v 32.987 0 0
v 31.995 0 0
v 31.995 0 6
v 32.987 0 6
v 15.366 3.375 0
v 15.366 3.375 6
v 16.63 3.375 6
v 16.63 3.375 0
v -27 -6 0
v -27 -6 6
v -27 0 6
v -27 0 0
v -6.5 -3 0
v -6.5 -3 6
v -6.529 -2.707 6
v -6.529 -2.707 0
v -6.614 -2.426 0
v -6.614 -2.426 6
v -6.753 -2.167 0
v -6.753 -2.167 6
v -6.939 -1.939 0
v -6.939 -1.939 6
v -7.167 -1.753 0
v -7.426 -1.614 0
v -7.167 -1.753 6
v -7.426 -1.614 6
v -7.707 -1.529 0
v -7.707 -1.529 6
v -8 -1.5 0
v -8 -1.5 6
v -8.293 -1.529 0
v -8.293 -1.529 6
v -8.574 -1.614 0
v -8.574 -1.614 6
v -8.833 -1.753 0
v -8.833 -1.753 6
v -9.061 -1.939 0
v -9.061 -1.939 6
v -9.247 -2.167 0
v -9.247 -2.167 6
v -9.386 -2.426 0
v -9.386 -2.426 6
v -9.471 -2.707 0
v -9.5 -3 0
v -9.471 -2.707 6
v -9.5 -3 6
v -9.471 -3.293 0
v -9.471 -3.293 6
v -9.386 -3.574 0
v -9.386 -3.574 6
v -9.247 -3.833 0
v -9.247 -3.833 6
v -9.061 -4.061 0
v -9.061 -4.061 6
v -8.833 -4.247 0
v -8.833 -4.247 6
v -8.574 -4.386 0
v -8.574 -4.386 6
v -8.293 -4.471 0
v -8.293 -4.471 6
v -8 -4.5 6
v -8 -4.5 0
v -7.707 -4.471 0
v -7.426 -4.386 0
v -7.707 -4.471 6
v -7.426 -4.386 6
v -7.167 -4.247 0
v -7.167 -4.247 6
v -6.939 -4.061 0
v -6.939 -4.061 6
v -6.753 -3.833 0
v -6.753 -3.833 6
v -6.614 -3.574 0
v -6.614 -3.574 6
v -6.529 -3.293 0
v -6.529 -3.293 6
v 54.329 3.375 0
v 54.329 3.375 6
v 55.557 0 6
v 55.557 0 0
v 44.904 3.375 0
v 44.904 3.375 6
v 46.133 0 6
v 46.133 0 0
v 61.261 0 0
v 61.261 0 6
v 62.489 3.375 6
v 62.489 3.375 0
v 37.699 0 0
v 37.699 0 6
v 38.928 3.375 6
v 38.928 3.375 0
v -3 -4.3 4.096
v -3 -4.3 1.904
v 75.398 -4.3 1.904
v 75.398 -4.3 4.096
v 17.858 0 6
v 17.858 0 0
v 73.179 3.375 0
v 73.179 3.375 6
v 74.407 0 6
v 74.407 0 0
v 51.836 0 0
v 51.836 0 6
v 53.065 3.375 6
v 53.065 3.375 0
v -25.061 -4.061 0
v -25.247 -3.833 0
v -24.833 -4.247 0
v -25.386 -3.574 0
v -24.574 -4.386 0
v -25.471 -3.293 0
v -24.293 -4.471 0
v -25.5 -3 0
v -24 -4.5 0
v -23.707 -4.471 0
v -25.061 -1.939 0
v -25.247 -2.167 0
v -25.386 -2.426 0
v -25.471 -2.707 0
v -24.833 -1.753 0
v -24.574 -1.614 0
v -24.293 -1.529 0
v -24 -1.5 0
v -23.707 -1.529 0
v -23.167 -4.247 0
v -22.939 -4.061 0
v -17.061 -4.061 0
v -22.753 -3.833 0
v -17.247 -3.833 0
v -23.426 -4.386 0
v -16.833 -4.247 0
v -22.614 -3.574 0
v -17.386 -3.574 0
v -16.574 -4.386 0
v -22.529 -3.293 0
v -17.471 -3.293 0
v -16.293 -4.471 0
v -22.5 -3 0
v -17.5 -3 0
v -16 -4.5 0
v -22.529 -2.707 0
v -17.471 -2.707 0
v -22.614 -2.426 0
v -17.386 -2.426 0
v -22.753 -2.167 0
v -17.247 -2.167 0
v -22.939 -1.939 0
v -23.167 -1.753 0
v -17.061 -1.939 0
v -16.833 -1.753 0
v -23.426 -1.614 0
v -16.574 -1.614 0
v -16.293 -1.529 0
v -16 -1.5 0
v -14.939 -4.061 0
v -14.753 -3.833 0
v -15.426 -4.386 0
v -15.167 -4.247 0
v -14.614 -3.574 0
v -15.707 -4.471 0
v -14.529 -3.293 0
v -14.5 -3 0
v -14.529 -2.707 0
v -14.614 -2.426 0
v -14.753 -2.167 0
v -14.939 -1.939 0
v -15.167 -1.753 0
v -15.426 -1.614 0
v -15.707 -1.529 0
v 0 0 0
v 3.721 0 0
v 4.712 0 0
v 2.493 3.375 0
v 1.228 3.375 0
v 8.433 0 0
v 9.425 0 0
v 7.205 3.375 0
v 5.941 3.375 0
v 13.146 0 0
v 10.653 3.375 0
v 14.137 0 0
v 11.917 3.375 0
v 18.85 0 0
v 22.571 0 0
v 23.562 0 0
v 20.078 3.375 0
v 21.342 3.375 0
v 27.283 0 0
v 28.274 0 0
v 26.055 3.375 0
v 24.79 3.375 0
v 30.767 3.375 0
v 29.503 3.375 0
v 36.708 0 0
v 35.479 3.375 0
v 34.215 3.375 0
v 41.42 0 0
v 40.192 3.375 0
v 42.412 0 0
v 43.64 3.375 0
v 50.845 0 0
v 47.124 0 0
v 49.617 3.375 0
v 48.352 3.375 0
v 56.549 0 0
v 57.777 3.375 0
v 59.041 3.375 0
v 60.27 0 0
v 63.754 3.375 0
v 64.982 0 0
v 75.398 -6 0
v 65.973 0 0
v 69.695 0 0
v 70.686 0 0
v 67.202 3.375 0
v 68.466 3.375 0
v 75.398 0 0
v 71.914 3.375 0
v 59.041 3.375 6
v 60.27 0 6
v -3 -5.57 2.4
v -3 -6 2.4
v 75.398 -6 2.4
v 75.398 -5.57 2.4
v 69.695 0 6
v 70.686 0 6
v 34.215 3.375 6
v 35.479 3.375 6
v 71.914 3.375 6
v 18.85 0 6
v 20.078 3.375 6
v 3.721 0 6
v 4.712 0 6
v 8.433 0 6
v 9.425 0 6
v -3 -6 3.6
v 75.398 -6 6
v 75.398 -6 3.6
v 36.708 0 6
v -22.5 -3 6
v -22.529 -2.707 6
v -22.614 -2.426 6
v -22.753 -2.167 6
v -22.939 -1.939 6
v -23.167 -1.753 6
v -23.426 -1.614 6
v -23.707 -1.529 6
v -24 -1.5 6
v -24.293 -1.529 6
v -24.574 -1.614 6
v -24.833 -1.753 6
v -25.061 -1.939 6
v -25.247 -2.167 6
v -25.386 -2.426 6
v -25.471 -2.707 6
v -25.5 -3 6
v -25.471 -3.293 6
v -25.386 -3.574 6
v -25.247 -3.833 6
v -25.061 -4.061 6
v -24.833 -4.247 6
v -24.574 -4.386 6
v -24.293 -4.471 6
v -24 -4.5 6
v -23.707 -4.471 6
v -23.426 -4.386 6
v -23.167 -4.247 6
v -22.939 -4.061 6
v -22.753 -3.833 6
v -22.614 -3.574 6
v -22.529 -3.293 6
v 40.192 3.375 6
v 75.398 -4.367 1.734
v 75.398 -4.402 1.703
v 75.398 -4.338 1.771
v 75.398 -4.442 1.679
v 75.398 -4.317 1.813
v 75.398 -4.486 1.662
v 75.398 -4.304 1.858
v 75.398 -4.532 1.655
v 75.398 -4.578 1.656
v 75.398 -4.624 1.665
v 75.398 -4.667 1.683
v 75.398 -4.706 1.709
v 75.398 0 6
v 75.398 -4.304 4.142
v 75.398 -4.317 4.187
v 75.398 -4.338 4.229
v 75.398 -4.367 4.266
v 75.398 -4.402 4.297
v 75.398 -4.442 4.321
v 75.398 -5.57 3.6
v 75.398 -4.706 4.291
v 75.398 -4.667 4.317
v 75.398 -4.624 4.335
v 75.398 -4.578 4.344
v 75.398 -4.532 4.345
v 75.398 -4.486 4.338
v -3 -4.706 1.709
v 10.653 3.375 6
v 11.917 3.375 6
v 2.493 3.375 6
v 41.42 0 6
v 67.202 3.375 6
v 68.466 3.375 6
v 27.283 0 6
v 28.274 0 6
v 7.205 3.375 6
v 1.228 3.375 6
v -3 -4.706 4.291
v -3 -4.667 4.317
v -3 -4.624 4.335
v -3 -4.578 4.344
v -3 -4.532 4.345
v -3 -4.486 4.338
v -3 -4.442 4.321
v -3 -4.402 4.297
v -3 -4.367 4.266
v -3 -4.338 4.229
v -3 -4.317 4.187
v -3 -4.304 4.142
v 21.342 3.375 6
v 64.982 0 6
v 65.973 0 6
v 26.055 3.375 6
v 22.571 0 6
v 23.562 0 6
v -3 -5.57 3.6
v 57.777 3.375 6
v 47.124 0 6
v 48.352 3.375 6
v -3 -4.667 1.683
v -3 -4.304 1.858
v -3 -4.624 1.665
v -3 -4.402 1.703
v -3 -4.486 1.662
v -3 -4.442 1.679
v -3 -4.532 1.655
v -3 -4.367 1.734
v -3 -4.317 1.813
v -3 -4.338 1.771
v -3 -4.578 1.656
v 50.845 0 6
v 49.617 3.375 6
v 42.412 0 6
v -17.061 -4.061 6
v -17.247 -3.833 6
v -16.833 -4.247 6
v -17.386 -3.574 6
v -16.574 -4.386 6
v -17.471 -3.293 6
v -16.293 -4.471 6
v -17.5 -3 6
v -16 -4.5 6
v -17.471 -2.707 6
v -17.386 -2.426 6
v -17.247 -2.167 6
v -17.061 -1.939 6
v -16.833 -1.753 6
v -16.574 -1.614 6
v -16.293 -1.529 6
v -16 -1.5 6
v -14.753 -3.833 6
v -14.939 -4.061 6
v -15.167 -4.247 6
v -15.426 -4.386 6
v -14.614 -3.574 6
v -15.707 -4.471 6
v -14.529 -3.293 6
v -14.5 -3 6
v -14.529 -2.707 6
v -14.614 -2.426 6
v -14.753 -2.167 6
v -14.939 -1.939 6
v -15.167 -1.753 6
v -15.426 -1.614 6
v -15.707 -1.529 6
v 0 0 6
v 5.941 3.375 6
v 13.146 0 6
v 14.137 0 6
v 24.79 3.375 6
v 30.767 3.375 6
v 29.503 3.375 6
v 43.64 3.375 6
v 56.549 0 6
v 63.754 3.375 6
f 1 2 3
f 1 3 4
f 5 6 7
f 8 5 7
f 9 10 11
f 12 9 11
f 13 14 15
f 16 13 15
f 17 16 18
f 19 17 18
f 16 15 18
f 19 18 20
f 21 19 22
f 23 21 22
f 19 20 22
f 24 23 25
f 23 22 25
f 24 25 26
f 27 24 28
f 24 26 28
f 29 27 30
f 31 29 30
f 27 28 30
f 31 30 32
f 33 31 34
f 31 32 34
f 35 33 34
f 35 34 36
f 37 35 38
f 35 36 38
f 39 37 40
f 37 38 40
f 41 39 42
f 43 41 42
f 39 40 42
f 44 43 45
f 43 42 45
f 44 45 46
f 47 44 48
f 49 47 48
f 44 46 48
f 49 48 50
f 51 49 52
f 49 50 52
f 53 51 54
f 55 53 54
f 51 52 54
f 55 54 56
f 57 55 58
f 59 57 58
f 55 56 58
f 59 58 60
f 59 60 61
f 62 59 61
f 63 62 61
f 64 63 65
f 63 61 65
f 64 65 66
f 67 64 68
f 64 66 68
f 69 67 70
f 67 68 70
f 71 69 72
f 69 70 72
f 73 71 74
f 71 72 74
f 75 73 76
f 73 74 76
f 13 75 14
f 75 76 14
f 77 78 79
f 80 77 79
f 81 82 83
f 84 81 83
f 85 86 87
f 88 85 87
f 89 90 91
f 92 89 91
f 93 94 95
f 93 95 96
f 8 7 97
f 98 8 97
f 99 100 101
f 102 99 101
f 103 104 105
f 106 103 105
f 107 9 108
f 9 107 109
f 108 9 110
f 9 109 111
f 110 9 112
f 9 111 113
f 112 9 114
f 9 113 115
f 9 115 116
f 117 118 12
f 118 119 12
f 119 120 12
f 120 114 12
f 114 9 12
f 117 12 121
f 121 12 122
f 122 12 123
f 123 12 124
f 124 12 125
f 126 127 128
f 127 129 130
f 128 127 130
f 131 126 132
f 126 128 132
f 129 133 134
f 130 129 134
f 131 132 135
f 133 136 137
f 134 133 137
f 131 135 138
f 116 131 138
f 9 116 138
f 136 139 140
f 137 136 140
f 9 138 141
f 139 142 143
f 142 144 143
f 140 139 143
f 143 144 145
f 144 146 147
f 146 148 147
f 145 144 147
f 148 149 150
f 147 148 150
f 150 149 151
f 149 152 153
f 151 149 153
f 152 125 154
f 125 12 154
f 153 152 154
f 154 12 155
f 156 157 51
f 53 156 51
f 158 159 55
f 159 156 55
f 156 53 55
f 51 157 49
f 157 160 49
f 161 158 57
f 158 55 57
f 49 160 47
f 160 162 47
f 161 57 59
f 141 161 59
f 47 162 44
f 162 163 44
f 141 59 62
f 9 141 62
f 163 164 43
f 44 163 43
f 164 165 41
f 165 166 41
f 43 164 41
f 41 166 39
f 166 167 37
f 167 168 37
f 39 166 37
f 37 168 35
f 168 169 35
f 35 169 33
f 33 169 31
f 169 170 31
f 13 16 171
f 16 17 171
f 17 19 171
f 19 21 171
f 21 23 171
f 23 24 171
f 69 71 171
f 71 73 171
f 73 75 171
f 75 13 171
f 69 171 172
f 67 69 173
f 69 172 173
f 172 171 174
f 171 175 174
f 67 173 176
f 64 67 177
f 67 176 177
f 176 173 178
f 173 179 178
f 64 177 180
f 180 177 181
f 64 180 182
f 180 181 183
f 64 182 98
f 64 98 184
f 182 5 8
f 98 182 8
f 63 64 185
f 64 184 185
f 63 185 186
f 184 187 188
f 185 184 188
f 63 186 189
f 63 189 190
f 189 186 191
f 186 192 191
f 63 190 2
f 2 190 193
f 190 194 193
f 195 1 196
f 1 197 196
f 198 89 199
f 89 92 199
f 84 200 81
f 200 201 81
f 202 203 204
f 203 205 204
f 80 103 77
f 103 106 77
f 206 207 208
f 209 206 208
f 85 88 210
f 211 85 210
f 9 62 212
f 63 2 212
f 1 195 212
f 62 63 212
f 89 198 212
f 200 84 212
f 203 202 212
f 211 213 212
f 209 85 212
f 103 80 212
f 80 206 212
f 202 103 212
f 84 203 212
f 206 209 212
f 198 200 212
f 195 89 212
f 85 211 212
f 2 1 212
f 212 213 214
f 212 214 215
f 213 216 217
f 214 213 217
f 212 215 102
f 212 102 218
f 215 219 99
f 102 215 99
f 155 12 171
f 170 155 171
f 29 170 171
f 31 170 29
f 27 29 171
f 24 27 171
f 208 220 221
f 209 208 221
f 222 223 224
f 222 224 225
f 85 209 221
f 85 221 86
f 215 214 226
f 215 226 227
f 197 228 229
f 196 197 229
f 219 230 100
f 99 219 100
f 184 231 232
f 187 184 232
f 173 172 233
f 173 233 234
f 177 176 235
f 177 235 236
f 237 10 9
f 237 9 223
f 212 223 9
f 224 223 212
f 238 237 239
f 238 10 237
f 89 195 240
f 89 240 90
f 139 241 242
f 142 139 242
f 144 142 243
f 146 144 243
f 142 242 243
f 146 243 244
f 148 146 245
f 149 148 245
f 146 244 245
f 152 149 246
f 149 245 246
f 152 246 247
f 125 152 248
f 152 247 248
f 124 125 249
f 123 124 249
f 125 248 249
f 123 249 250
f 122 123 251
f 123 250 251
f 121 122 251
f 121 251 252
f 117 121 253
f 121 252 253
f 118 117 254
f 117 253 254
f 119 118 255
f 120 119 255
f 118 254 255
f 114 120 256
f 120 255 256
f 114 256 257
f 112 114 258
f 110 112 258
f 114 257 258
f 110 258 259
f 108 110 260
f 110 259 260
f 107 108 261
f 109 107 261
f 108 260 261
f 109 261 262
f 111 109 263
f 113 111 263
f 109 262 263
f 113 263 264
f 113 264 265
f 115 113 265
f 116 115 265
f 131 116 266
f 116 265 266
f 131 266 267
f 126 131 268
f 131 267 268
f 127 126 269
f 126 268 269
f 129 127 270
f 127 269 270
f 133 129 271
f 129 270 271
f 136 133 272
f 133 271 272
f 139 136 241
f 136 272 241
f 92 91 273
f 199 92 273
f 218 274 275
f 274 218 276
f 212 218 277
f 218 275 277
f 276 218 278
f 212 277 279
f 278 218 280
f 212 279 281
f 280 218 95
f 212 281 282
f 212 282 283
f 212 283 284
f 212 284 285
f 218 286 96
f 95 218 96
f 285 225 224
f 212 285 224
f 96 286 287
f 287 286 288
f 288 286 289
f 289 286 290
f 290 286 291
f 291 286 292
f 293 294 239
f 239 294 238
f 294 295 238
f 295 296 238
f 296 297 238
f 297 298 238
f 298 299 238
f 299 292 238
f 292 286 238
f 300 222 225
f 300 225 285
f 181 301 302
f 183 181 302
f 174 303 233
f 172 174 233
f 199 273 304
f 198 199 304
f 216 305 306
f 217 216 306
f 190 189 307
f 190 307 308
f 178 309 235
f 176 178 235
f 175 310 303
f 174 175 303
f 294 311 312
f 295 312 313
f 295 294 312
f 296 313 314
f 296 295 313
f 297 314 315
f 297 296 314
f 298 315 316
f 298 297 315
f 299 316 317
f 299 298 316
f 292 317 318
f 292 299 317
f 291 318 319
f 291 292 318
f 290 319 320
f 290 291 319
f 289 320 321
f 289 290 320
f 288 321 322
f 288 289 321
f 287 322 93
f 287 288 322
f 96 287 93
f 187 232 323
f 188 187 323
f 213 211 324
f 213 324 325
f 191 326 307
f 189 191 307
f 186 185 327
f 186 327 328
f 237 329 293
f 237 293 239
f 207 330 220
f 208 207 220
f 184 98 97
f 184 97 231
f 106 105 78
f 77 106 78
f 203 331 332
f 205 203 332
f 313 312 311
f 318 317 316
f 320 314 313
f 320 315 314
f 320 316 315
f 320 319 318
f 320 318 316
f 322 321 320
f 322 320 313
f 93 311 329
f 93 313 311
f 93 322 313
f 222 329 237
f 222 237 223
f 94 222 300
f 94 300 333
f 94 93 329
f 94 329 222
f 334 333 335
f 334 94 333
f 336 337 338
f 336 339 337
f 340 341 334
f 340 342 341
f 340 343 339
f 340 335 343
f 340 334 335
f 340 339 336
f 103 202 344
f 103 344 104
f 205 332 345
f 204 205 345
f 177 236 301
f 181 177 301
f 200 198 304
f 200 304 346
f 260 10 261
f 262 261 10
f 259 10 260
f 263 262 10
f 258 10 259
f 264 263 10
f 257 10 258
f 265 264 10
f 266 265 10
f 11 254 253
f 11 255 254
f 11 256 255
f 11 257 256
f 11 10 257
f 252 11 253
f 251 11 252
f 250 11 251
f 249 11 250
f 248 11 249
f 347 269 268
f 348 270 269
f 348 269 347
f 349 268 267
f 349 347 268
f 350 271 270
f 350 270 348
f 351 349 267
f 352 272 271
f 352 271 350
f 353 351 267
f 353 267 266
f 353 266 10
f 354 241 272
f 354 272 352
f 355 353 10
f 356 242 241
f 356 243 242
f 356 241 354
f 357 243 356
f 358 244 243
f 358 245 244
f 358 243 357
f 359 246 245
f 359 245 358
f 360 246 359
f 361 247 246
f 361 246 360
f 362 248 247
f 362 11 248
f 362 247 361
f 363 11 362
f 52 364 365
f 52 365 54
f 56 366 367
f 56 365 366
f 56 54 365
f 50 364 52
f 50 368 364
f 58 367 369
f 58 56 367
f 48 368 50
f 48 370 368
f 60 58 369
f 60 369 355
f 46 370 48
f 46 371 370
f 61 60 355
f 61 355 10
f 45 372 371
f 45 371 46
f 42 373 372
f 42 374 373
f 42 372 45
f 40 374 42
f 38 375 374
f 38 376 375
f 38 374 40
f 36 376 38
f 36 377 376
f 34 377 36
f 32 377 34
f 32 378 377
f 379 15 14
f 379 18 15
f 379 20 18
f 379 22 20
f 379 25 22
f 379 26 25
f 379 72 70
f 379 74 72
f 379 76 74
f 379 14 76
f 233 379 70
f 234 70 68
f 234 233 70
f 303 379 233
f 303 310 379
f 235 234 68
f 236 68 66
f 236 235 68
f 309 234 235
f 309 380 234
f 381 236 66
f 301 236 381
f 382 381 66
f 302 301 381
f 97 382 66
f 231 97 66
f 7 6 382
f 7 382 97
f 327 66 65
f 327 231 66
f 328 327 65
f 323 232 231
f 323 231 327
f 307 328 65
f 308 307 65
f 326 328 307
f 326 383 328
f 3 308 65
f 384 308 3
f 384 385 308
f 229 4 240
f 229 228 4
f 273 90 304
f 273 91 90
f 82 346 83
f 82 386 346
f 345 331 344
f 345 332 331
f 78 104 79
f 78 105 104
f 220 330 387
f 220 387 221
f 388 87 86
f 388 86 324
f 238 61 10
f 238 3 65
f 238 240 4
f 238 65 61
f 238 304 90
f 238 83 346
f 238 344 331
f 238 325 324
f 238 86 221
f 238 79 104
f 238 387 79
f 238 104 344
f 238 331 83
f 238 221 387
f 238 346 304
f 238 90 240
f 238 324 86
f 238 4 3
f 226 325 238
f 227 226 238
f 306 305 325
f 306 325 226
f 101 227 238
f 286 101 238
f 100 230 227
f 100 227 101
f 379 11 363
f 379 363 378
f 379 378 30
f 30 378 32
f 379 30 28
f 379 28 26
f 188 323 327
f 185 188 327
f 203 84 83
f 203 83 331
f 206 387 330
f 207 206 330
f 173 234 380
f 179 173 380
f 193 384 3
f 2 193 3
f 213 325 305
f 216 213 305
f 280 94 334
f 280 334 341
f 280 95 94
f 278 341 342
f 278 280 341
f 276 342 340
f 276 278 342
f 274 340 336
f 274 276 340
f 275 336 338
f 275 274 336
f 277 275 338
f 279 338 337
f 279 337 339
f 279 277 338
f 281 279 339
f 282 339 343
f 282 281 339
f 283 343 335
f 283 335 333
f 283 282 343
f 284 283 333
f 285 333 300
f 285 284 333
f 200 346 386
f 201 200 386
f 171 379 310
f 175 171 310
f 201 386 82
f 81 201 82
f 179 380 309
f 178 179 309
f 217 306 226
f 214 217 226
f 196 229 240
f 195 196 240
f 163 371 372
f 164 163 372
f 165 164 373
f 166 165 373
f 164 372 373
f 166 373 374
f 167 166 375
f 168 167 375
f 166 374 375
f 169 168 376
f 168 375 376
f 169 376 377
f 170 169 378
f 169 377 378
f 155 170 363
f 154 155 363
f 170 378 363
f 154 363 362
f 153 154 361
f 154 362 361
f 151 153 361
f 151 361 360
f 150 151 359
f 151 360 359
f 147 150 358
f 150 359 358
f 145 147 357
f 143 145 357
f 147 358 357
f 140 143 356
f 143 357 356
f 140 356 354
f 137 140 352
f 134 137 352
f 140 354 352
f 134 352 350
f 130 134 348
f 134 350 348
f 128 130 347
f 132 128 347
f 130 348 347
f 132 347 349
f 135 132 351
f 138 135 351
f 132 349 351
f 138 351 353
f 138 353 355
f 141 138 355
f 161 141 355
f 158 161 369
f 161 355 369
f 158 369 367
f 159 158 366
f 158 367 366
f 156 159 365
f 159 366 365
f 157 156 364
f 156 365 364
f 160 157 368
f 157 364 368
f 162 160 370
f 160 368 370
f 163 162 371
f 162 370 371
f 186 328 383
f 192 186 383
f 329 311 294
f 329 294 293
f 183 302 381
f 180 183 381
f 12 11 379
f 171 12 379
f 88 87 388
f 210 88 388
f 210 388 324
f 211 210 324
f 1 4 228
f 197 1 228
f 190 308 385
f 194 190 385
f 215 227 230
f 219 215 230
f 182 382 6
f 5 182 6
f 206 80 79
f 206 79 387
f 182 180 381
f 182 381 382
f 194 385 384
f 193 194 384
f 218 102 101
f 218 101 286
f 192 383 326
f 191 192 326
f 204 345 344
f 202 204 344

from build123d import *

# Parameters (mm, degrees)
SKETCH_1_W             = 94.247779608
SKETCH_1_H             = 6
EXTRUDE_1_DEPTH        = 6
EXTRUDE_2_DEPTH        = 6
PATTERN_LINEAR_1_COUNT = 20
PATTERN_LINEAR_1_PITCH = 4.71238898
SKETCH_4_W             = 27
SKETCH_4_H             = 6
SKETCH_4_R             = 1.5
EXTRUDE_1_2_DEPTH      = 6
CUT_EXTRUDE_1_DEPTH    = 10
CUT_EXTRUDE_START      = -24
CUT_EXTRUDE_2_DEPTH    = 79.74919082
FILLET_1_R             = 0.25


with BuildPart() as part:
    # 草图1 → Extrude 1 (new body)
    with BuildSketch(Plane.XY):
        with Locations((47.123889804, -3)):
            Rectangle(SKETCH_1_W, SKETCH_1_H)
    extrude(amount=EXTRUDE_1_DEPTH)

    # 草图2 → 拉伸2 (add)
    with BuildSketch(Plane.XY.offset(6)):
        Polygon((0, 0), (1.228399541, 3.375), (2.492683328, 3.375), (3.721082869, 0), align=None)
    extrude_2 = extrude(amount=-EXTRUDE_2_DEPTH)

    # 阵列(线性)1: 拉伸2 ×20
    with Locations(*[(i * PATTERN_LINEAR_1_PITCH, 0, 0) for i in range(1, PATTERN_LINEAR_1_COUNT)]):
        add(extrude_2)

    # 草图4 → Extrude 1 2 (add)
    with BuildSketch(Plane.XY.offset(6)):
        with Locations((-13.5, -3)):
            Rectangle(SKETCH_4_W, SKETCH_4_H)
        with Locations((-24, -3)):
            Circle(SKETCH_4_R, mode=Mode.SUBTRACT)
        with Locations((-16, -3)):
            Circle(SKETCH_4_R, mode=Mode.SUBTRACT)
        with Locations((-8, -3)):
            Circle(SKETCH_4_R, mode=Mode.SUBTRACT)
    extrude(amount=-EXTRUDE_1_2_DEPTH)

    # 草图5 → 切除-拉伸1 (cut)
    with BuildSketch(Plane.XY.offset(6)):
        Polygon((94.247779608, -6), (94.247779608, 6), (75.398223686, 6), (75.398223686, 0), (75.398223686, -6), align=None)
    extrude(amount=-CUT_EXTRUDE_1_DEPTH, mode=Mode.SUBTRACT)

    # 草图6 → 切除-拉伸2 (cut, through all)
    with BuildSketch(Plane.ZY.offset(27).offset(CUT_EXTRUDE_START)):
        Polygon((2.4, -5.570156212), (1.383875031, -4.3), (4.616124969, -4.3), (3.6, -5.570156212), (3.6, -6.2), (2.4, -6.2), align=None)
    extrude(amount=-CUT_EXTRUDE_2_DEPTH, mode=Mode.SUBTRACT)

    # 圆角1
    fillet_1_edges = [part.edges().sort_by_distance(p)[0] for p in [
        (36.199111843, -4.3, 1.383875031),
        (36.199111843, -4.3, 4.616124969),
    ]]
    fillet(fillet_1_edges, radius=FILLET_1_R)


solid = part.part
